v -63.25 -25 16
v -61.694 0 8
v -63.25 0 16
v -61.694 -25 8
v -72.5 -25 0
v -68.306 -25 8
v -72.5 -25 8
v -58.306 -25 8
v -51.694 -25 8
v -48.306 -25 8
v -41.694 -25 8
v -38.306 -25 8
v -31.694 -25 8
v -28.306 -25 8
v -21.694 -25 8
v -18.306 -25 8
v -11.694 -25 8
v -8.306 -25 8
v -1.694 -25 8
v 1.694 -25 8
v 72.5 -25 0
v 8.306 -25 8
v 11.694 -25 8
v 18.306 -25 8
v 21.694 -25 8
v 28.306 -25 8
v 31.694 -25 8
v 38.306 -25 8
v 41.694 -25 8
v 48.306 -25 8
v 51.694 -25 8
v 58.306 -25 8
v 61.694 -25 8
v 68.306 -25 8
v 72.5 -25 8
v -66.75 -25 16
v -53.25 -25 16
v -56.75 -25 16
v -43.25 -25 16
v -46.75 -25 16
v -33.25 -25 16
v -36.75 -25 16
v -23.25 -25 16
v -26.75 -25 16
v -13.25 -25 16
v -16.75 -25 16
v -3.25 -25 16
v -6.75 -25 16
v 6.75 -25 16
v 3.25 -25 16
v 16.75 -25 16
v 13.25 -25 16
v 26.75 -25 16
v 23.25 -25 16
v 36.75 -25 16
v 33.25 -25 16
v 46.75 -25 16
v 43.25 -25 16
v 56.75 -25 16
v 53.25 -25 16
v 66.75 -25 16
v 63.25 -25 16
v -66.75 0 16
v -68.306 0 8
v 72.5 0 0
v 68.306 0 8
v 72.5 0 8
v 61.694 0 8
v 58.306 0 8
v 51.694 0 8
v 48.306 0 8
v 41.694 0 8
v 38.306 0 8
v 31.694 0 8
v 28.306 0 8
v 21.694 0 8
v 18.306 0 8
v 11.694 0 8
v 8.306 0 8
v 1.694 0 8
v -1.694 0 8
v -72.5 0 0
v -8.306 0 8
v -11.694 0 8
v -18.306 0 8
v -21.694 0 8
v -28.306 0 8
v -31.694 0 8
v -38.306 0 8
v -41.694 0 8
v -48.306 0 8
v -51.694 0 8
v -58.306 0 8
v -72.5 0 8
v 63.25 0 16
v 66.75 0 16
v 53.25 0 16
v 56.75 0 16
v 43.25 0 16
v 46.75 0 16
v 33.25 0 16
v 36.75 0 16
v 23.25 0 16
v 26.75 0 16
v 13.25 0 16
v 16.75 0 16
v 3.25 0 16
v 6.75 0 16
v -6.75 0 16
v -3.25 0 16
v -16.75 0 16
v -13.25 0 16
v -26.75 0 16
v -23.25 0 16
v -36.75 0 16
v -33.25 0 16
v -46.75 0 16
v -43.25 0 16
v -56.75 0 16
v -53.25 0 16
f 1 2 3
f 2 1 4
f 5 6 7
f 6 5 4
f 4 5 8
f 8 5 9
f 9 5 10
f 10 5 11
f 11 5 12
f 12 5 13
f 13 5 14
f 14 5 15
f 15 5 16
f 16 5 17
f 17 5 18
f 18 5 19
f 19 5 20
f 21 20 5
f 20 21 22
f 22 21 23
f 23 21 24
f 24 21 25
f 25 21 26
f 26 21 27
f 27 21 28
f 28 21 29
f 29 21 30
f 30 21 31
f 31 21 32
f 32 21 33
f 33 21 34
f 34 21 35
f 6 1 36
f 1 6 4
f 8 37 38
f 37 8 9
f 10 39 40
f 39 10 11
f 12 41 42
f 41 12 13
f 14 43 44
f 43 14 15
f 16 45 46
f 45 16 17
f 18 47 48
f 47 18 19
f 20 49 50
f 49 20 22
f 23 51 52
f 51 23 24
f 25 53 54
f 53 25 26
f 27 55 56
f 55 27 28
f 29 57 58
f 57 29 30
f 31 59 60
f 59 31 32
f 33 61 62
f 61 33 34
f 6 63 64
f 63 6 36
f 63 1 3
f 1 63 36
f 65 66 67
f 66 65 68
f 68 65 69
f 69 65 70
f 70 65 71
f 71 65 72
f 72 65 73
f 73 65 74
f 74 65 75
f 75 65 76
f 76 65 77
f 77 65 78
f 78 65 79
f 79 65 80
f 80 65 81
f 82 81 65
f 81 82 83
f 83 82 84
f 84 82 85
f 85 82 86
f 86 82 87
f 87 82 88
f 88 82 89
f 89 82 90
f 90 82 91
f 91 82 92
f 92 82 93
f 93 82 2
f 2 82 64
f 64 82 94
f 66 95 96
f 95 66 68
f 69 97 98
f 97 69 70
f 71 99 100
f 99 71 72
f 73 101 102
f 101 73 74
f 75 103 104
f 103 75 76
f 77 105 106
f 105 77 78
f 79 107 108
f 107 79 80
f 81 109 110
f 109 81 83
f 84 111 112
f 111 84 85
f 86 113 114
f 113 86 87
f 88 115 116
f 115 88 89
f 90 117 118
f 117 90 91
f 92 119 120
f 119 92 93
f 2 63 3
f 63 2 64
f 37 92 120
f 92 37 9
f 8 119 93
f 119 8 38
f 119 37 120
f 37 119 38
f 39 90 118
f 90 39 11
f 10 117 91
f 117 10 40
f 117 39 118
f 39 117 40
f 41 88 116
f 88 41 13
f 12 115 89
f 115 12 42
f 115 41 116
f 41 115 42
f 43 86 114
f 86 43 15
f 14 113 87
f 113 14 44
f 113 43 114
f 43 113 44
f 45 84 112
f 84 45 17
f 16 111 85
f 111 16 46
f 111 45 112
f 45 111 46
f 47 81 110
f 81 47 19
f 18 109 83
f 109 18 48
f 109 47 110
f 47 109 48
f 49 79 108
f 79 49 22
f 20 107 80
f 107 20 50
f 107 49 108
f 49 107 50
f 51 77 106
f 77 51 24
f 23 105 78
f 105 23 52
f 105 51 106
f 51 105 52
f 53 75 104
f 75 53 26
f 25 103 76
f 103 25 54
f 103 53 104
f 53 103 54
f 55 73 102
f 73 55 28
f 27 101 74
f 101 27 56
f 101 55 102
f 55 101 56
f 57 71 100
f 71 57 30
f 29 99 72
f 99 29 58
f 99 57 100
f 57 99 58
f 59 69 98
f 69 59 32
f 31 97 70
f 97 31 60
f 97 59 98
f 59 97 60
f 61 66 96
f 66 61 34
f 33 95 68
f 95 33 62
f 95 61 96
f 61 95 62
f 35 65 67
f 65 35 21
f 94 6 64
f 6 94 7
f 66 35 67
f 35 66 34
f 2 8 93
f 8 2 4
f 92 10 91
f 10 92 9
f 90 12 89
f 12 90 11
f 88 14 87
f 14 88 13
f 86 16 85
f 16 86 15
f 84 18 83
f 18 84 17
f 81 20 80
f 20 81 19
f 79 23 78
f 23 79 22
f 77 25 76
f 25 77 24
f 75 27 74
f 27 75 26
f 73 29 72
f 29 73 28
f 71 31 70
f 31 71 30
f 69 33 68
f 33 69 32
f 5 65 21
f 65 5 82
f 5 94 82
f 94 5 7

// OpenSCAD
$fn = 32;

// ----------------------------------------------------------------------
// Toothed rack, 14 teeth
// 10 mm pitch, 8 mm teeth
// ----------------------------------------------------------------------

// --- parameters (mm) ---
bar_w = 25;     // bar width (Y)
bar_h = 8;      // bar height (Z)
teeth = 14;     // number of teeth
pitch = 10;     // tooth pitch
tooth_h = 8;    // tooth height above the bar
root_w = 7;     // tooth width at the root
crest_w = 3.5;  // tooth width at the crest

// --- derived feature positions (mm) ---
span = (teeth - 1) * pitch;  // = 130   distance between the outer teeth
bar_l = span + root_w + 8;   // = 145   bar length: teeth plus 4 mm at each end
tooth_x = -span / 2;         // = -65   X of the first tooth
height = bar_h + tooth_h;    // = 16   overall height
feature_centers = [
  [tooth_x + 0 * pitch, -bar_w / 2],
  [tooth_x + 1 * pitch, -bar_w / 2],
  [tooth_x + 2 * pitch, -bar_w / 2],
  [tooth_x + 3 * pitch, -bar_w / 2],
  [tooth_x + 4 * pitch, -bar_w / 2],
  [tooth_x + 5 * pitch, -bar_w / 2],
  [tooth_x + 6 * pitch, -bar_w / 2],
  [tooth_x + 7 * pitch, -bar_w / 2],
  [tooth_x + 8 * pitch, -bar_w / 2],
  [tooth_x + 9 * pitch, -bar_w / 2],
  [tooth_x + 10 * pitch, -bar_w / 2],
  [tooth_x + 11 * pitch, -bar_w / 2],
  [tooth_x + 12 * pitch, -bar_w / 2],
  [tooth_x + 13 * pitch, -bar_w / 2]
];   // tooth centre line, drives the tooth loop

// bar with a rack of teeth, one extruded trapezoium per centre
module rack_tooth() {
  linear_extrude(height = bar_w)
    polygon(points = [
      [0, 0],
      [root_w, 0],
      [root_w / 2 + crest_w / 2, tooth_h + 1],
      [root_w / 2 - crest_w / 2, tooth_h + 1]
    ]);
}

union() {
  translate([-bar_l / 2, -bar_w, 0]) cube([bar_l, bar_w, bar_h]);
  for (centre = feature_centers)
    translate([centre[0] - root_w / 2, 0, bar_h - 1]) rotate([90, 0, 0]) rack_tooth();
}
